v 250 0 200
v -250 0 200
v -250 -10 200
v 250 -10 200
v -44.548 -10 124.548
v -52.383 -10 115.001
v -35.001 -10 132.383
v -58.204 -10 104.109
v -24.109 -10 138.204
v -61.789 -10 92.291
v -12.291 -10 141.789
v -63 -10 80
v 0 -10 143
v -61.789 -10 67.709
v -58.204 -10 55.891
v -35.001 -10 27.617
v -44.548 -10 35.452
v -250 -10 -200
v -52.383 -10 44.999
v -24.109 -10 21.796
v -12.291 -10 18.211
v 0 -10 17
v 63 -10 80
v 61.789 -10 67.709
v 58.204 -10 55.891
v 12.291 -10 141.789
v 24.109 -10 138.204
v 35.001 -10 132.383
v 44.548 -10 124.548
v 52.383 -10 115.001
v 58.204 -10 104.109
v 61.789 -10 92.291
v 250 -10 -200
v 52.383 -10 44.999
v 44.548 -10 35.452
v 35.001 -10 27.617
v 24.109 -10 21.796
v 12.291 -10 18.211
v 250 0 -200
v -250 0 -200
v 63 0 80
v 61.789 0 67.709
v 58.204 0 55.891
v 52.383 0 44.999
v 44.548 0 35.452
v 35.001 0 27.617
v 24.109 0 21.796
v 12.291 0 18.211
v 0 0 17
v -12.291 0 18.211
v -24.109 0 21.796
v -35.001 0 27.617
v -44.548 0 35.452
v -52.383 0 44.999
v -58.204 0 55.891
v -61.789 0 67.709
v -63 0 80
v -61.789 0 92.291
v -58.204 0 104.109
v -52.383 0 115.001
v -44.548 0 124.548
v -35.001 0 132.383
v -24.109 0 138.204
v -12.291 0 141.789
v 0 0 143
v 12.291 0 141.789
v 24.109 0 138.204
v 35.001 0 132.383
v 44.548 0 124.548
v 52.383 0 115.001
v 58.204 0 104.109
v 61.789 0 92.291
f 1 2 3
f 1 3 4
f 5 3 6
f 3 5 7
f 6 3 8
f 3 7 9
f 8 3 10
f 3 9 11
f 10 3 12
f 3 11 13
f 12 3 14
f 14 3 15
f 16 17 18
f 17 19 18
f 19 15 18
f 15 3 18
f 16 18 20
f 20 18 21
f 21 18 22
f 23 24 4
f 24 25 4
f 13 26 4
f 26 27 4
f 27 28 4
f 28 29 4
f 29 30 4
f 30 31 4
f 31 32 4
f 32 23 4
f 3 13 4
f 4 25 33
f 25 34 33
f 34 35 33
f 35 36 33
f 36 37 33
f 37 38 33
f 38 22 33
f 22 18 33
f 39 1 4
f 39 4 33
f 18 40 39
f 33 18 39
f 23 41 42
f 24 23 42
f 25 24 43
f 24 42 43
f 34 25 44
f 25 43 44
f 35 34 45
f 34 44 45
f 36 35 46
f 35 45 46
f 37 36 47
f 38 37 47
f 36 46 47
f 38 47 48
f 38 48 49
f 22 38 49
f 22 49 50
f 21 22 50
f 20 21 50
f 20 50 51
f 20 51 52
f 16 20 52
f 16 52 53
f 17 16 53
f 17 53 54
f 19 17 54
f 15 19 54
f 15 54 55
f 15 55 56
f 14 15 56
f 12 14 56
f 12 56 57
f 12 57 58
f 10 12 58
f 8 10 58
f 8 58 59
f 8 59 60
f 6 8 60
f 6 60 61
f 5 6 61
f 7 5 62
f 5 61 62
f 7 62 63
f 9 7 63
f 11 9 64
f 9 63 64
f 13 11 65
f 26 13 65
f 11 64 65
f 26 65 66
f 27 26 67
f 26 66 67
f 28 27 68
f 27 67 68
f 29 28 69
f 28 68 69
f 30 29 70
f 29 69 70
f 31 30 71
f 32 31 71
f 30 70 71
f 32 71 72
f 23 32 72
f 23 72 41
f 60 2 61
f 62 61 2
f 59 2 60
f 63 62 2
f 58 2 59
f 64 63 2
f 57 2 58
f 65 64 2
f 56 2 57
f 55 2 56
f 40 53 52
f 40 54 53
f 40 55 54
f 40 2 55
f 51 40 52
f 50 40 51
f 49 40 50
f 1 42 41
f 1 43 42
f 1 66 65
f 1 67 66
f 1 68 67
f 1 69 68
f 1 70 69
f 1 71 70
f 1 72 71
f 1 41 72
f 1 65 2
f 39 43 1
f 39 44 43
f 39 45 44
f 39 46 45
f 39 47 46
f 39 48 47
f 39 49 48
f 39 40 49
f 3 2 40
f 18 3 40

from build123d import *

# Parameters (mm, degrees)
SKETCH1_W           = 500
SKETCH1_H           = 400
BOSS_EXTRUDE1_DEPTH = 10
SKETCH2_R           = 63
CUT_EXTRUDE1_DEPTH  = 20


with BuildPart() as part:
    # Sketch1 → Boss-Extrude1 (new body)
    with BuildSketch(Plane(origin=(0, 0, 0), x_dir=(1, 0, 0), z_dir=(0, 1, 0))):
        Rectangle(SKETCH1_W, SKETCH1_H)
    extrude(amount=-BOSS_EXTRUDE1_DEPTH)

    # Sketch2 → Cut-Extrude1 (cut)
    with BuildSketch(Plane(origin=(0, 0, 0), x_dir=(1, 0, 0), z_dir=(0, 1, 0))):
        with Locations((0, -80)):
            Circle(SKETCH2_R)
    extrude(amount=-CUT_EXTRUDE1_DEPTH, mode=Mode.SUBTRACT)


solid = part.part
